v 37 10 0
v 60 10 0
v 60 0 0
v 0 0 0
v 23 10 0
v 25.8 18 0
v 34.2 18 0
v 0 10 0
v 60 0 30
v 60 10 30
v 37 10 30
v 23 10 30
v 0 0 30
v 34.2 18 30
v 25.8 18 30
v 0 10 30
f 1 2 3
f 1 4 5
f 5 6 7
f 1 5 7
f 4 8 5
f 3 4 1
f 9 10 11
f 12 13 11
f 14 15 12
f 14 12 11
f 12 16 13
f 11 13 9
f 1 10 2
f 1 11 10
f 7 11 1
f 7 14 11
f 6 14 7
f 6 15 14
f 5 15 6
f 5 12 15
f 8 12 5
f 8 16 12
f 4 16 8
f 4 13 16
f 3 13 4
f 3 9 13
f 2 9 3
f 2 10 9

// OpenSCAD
$fn = 32;

// ----------------------------------------------------------------------
// V guide rail: dovetail, 60 mm wide
// ----------------------------------------------------------------------

// --- parameters (mm) ---
rail_w = 60;              // rail width, X
base_t = 10;              // base plate thickness
v_depth = 8;              // V feature depth / height
v_half_w = 7;             // half width of the V at the base face
plate_t = 30;             // rail length, Z (the extrusion height)
top_half_w = 4.2;         // half width at the dovetail top

dovetail_base = 2 * v_half_w;  // dovetail width at the base
dovetail_top = 2 * top_half_w;  // dovetail width at the top

profile = [[0, 0], [60, 0], [60, 10], [37, 10], [34.2, 18], [25.8, 18], [23, 10], [0, 10]];  // primary outline, 8 points, counter clockwise

// --- the one profile operation ---
linear_extrude(height = plate_t) polygon(points = profile);
